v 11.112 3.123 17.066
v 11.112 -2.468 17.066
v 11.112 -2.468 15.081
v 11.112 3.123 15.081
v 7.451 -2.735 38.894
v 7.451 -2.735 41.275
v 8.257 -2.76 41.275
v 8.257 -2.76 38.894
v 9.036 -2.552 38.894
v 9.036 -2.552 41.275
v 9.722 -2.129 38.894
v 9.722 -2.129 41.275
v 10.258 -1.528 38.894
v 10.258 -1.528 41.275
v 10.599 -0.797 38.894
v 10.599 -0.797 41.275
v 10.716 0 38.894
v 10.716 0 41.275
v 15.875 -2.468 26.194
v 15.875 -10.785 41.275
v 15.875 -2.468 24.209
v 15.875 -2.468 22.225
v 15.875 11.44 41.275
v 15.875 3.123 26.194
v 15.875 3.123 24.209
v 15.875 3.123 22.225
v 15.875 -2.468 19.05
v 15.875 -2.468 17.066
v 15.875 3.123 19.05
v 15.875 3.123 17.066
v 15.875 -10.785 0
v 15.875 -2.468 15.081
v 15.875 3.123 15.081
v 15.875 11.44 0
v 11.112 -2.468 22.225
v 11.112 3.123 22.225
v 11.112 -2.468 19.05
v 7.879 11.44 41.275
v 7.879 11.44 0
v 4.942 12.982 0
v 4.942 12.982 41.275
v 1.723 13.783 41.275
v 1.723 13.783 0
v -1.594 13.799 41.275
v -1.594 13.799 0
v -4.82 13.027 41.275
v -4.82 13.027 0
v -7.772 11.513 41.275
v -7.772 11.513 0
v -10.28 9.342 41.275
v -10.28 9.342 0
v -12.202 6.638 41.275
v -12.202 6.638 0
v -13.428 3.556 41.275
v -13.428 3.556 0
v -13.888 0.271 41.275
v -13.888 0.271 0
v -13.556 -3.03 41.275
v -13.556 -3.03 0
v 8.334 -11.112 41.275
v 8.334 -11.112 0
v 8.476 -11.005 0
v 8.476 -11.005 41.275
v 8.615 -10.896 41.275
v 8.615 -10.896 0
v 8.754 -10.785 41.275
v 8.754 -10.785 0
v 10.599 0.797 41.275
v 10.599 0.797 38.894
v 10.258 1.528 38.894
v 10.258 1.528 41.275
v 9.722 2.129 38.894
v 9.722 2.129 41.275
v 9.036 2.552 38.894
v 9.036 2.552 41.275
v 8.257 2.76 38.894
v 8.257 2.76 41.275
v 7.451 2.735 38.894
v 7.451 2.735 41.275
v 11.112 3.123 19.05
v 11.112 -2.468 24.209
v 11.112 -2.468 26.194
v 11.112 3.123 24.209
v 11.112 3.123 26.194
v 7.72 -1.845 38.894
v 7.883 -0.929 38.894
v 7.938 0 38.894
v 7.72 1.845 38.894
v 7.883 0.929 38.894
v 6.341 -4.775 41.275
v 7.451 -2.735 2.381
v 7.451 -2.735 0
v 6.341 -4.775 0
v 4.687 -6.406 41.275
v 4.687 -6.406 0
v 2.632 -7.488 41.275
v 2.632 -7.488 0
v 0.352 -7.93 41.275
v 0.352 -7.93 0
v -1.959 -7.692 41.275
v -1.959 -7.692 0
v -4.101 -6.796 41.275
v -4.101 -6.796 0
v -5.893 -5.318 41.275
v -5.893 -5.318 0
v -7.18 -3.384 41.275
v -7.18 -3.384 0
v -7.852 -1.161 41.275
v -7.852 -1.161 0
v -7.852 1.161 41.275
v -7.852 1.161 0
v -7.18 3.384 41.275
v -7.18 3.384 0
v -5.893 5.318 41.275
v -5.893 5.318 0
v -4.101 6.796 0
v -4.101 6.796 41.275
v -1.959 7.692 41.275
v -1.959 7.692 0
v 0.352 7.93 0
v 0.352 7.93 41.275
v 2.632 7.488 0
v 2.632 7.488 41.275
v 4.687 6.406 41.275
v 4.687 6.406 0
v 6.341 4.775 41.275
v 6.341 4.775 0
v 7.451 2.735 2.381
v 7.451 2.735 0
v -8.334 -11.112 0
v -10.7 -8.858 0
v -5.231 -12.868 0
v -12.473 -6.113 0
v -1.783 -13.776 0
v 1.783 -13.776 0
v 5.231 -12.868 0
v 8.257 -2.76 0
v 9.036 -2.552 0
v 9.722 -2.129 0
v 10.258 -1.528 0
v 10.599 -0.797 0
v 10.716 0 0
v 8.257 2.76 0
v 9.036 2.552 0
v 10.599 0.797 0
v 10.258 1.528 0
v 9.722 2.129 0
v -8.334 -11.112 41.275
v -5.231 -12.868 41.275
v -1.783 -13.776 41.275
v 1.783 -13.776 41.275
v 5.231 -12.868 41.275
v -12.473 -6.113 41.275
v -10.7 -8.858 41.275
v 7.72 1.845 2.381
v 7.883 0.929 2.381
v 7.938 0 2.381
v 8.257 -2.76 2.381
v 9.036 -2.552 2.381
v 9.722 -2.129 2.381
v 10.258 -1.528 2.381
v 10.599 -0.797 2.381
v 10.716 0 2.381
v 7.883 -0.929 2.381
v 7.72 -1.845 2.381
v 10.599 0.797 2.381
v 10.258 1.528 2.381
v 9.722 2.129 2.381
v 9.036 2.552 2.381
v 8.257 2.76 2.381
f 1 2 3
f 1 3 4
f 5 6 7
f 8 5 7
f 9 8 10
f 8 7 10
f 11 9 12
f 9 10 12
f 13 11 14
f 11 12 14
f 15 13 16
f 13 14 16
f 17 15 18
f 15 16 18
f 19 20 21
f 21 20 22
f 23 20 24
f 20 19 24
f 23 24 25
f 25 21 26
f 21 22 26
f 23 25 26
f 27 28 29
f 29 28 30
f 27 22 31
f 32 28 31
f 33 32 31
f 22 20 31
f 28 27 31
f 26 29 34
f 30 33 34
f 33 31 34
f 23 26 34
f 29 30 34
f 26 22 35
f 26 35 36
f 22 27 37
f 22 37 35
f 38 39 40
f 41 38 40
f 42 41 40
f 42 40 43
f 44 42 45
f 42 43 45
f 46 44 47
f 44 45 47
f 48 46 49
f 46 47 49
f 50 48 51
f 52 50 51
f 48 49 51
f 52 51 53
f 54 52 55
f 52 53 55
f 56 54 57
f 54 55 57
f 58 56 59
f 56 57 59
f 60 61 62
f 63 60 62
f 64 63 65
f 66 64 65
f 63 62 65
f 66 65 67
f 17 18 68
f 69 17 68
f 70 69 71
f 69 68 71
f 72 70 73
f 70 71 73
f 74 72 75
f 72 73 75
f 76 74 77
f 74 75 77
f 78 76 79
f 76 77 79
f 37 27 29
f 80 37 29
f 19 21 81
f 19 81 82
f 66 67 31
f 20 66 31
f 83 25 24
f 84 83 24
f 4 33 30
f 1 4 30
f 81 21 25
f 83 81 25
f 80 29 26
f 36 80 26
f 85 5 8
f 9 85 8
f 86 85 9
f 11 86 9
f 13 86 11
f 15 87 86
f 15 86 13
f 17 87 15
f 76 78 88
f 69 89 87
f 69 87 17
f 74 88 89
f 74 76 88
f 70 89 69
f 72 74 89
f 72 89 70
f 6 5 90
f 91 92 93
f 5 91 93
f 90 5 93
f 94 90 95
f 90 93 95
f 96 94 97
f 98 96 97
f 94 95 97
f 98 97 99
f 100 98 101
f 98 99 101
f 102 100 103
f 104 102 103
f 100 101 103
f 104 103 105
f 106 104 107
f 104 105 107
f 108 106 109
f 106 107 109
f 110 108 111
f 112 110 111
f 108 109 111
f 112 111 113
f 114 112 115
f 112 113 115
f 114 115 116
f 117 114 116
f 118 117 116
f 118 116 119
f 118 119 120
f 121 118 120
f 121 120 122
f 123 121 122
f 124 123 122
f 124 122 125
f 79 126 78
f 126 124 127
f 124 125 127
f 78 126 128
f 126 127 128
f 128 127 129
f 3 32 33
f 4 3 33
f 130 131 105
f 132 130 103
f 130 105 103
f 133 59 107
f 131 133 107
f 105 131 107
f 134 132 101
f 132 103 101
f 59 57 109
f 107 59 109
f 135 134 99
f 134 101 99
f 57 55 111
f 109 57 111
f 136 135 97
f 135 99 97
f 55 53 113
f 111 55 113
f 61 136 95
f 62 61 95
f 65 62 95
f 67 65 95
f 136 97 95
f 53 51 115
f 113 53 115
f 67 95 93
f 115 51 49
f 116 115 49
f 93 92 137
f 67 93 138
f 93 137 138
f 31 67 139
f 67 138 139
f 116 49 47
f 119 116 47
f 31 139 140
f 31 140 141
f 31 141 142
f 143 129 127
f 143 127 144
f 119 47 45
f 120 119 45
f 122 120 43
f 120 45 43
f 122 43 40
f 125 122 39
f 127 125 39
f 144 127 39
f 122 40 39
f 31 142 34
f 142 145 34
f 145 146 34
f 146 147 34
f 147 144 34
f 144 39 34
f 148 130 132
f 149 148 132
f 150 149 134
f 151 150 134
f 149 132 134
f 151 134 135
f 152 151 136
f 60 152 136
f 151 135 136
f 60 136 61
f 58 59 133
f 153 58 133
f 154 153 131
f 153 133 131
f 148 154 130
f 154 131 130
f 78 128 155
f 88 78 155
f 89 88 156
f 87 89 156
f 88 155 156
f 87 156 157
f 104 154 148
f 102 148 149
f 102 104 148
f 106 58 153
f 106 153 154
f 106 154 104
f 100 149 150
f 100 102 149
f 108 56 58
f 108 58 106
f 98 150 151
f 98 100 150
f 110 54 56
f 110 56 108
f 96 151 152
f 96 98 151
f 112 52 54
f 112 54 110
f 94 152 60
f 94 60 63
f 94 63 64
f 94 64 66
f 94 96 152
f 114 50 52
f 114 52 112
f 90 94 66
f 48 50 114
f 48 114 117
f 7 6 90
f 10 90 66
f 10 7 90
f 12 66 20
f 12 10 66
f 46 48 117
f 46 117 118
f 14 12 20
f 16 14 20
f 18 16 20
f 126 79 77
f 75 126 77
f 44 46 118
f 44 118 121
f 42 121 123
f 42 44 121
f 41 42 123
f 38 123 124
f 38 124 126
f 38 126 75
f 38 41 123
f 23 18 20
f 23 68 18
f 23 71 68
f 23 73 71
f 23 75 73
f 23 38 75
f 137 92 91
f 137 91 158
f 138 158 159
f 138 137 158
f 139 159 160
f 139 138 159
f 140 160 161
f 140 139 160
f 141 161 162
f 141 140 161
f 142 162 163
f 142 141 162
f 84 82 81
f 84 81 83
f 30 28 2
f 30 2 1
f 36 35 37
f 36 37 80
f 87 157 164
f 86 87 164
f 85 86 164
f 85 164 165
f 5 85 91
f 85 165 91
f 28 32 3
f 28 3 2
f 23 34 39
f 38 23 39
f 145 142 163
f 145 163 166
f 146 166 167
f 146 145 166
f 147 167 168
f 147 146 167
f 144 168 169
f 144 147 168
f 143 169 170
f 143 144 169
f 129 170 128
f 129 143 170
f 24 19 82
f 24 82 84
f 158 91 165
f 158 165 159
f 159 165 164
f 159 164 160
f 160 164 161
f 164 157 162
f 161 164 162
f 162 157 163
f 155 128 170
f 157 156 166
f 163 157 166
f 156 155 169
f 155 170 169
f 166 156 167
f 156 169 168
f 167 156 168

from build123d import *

# Parameters (mm, degrees)
F2_DEPTH = 41.275
F3_DEPTH = 41.275
F4_W     = 5.590443
F4_H     = 1.984375
F4_H_2   = 3.175
F5_DEPTH = 4.7625
F7_DEPTH = 2.38125
F8_DEPTH = 2.38125


with BuildPart() as f2:
    # F1 (on Top) → F2 (new body)
    with BuildSketch(Plane.XY):
        with BuildLine():
            ThreePointArc((8.334375, -11.1125), (12.424153, -6.212076), (13.890625, 0))
            ThreePointArc((13.890625, 0), (12.424153, 6.212076), (8.334375, 11.1125))
            ThreePointArc((8.334375, 11.1125), (-7.53772, 11.667572), (-13.556196, -3.029687))
            ThreePointArc((-13.556196, -3.029687), (-11.667572, -7.53772), (-8.334375, -11.1125))
            ThreePointArc((-8.334375, -11.1125), (0, -13.890625), (8.334375, -11.1125))
        make_face()
        with BuildLine():
            ThreePointArc((7.451328, -2.735254), (-7.9375, 0), (7.451328, 2.735254))
            ThreePointArc((7.451328, 2.735254), (9.721783, 2.129392), (10.715625, 0))
            ThreePointArc((10.715625, 0), (9.721783, -2.129392), (7.451328, -2.735254))
        make_face(mode=Mode.SUBTRACT)
        with BuildLine():
            ThreePointArc((7.451328, 2.735254), (7.815012, 1.389063), (7.9375, 0))
            ThreePointArc((7.9375, 0), (7.815012, -1.389063), (7.451328, -2.735254))
            ThreePointArc((7.451328, -2.735254), (9.721783, -2.129392), (10.715625, 0))
            ThreePointArc((10.715625, 0), (9.721783, 2.129392), (7.451328, 2.735254))
        make_face()
    extrude(amount=F2_DEPTH)

    # F0 (on Top) → F3 (join)
    with BuildSketch(Plane.XY):
        with BuildLine():
            ThreePointArc((7.879068, 11.439832), (12.296232, 6.46159), (13.890625, 0))
            ThreePointArc((13.890625, 0), (12.540847, -5.972991), (8.753834, -10.785168))
            Line((8.753834, -10.785168), (15.875, -10.785168))
            Line((15.875, -10.785168), (15.875, 0.327332))
            Line((15.875, 0.327332), (15.875, 11.439832))
            Line((15.875, 11.439832), (7.879068, 11.439832))
        make_face()
    extrude(amount=F3_DEPTH)

    # F4 (on face) → F5 (cut)
    with BuildSketch(Plane.YZ.offset(15.875)):
        with Locations((0.327332, 25.201562)):
            Rectangle(F4_W, F4_H)
        with Locations((0.327332, 20.6375)):
            Rectangle(F4_W, F4_H_2)
        with Locations((0.327332, 16.073438)):
            Rectangle(F4_W, F4_H)
    extrude(amount=-F5_DEPTH, mode=Mode.SUBTRACT)

    # F6 (on face) → F7 (cut)
    with BuildSketch(Plane.XY.offset(41.275)):
        with BuildLine():
            ThreePointArc((7.451328, -2.735254), (9.721783, -2.129392), (10.715625, 0))
            ThreePointArc((10.715625, 0), (9.721783, 2.129392), (7.451328, 2.735254))
            ThreePointArc((7.451328, 2.735254), (7.815012, 1.389062), (7.9375, 0))
            ThreePointArc((7.9375, 0), (7.815012, -1.389063), (7.451328, -2.735254))
        make_face()
    extrude(amount=-F7_DEPTH, mode=Mode.SUBTRACT)

    # F1 (on Top) → F8 (cut)
    with BuildSketch(Plane.XY):
        with BuildLine():
            ThreePointArc((7.451328, 2.735254), (7.815012, 1.389063), (7.9375, 0))
            ThreePointArc((7.9375, 0), (7.815012, -1.389063), (7.451328, -2.735254))
            ThreePointArc((7.451328, -2.735254), (9.721783, -2.129392), (10.715625, 0))
            ThreePointArc((10.715625, 0), (9.721783, 2.129392), (7.451328, 2.735254))
        make_face()
    extrude(amount=F8_DEPTH, mode=Mode.SUBTRACT)


solid = f2.part
